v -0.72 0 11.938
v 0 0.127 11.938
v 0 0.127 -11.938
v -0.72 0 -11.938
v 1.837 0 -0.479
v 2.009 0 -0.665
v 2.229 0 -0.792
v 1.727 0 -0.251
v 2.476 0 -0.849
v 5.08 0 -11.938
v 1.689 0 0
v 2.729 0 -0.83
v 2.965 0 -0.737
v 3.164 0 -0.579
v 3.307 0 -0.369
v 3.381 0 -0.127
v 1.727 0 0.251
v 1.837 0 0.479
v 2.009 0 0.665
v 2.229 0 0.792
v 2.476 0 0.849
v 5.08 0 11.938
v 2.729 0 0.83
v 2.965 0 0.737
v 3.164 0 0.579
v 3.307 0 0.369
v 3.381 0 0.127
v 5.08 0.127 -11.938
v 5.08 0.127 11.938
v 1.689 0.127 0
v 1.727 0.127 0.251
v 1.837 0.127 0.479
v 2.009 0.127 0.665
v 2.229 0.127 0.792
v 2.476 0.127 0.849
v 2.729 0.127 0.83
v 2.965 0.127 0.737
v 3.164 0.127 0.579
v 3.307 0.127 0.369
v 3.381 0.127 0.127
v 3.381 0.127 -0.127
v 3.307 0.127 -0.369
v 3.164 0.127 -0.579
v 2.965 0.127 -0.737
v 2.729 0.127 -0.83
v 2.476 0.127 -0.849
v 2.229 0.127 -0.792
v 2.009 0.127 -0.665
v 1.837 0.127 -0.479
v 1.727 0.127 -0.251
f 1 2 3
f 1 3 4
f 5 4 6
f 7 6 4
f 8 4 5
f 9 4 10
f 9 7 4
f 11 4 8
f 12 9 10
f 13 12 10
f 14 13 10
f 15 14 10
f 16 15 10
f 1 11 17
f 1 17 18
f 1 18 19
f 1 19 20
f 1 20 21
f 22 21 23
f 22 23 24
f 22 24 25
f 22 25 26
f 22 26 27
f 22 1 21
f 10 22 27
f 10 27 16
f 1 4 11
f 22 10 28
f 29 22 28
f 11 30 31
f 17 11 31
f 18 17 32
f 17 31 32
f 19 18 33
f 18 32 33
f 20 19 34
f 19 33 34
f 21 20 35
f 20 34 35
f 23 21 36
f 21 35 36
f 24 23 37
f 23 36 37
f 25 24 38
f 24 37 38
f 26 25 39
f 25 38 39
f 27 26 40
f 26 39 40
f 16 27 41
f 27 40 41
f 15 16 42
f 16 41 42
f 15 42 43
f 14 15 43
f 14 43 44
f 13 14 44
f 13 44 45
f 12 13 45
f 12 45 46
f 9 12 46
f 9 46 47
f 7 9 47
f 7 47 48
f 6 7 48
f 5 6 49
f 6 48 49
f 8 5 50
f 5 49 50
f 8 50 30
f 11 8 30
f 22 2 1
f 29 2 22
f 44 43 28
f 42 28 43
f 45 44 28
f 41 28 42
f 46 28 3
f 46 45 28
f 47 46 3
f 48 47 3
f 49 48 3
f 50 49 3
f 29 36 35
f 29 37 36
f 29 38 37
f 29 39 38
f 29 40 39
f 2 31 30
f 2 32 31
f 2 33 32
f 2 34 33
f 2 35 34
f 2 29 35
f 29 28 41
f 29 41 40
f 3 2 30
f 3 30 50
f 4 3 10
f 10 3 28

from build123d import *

# Parameters (mm, degrees)
BOSS_EXTRUDE1_DEPTH = 11.938
SKETCH3_R           = 0.8509
CUT_EXTRUDE1_DEPTH  = 0.127


with BuildPart() as part:
    # Sketch2 → Boss-Extrude1 (new, symmetric)
    with BuildSketch(Plane.XY):
        Polygon((0, 0), (5.08, 0), (5.08, 0.127), (0, 0.127), (-0.720252791, 0), align=None)
    extrude(amount=BOSS_EXTRUDE1_DEPTH, both=True)

    # Sketch3 → Cut-Extrude1 (cut)
    with BuildSketch(Plane(origin=(0, 0.127, 0), x_dir=(1, 0, 0), z_dir=(0, 1, 0))):
        with Locations(Location((2.54, 0, 0), (0, 0, 180))):
            Circle(SKETCH3_R)
    extrude(amount=-CUT_EXTRUDE1_DEPTH, mode=Mode.SUBTRACT)


solid = part.part
